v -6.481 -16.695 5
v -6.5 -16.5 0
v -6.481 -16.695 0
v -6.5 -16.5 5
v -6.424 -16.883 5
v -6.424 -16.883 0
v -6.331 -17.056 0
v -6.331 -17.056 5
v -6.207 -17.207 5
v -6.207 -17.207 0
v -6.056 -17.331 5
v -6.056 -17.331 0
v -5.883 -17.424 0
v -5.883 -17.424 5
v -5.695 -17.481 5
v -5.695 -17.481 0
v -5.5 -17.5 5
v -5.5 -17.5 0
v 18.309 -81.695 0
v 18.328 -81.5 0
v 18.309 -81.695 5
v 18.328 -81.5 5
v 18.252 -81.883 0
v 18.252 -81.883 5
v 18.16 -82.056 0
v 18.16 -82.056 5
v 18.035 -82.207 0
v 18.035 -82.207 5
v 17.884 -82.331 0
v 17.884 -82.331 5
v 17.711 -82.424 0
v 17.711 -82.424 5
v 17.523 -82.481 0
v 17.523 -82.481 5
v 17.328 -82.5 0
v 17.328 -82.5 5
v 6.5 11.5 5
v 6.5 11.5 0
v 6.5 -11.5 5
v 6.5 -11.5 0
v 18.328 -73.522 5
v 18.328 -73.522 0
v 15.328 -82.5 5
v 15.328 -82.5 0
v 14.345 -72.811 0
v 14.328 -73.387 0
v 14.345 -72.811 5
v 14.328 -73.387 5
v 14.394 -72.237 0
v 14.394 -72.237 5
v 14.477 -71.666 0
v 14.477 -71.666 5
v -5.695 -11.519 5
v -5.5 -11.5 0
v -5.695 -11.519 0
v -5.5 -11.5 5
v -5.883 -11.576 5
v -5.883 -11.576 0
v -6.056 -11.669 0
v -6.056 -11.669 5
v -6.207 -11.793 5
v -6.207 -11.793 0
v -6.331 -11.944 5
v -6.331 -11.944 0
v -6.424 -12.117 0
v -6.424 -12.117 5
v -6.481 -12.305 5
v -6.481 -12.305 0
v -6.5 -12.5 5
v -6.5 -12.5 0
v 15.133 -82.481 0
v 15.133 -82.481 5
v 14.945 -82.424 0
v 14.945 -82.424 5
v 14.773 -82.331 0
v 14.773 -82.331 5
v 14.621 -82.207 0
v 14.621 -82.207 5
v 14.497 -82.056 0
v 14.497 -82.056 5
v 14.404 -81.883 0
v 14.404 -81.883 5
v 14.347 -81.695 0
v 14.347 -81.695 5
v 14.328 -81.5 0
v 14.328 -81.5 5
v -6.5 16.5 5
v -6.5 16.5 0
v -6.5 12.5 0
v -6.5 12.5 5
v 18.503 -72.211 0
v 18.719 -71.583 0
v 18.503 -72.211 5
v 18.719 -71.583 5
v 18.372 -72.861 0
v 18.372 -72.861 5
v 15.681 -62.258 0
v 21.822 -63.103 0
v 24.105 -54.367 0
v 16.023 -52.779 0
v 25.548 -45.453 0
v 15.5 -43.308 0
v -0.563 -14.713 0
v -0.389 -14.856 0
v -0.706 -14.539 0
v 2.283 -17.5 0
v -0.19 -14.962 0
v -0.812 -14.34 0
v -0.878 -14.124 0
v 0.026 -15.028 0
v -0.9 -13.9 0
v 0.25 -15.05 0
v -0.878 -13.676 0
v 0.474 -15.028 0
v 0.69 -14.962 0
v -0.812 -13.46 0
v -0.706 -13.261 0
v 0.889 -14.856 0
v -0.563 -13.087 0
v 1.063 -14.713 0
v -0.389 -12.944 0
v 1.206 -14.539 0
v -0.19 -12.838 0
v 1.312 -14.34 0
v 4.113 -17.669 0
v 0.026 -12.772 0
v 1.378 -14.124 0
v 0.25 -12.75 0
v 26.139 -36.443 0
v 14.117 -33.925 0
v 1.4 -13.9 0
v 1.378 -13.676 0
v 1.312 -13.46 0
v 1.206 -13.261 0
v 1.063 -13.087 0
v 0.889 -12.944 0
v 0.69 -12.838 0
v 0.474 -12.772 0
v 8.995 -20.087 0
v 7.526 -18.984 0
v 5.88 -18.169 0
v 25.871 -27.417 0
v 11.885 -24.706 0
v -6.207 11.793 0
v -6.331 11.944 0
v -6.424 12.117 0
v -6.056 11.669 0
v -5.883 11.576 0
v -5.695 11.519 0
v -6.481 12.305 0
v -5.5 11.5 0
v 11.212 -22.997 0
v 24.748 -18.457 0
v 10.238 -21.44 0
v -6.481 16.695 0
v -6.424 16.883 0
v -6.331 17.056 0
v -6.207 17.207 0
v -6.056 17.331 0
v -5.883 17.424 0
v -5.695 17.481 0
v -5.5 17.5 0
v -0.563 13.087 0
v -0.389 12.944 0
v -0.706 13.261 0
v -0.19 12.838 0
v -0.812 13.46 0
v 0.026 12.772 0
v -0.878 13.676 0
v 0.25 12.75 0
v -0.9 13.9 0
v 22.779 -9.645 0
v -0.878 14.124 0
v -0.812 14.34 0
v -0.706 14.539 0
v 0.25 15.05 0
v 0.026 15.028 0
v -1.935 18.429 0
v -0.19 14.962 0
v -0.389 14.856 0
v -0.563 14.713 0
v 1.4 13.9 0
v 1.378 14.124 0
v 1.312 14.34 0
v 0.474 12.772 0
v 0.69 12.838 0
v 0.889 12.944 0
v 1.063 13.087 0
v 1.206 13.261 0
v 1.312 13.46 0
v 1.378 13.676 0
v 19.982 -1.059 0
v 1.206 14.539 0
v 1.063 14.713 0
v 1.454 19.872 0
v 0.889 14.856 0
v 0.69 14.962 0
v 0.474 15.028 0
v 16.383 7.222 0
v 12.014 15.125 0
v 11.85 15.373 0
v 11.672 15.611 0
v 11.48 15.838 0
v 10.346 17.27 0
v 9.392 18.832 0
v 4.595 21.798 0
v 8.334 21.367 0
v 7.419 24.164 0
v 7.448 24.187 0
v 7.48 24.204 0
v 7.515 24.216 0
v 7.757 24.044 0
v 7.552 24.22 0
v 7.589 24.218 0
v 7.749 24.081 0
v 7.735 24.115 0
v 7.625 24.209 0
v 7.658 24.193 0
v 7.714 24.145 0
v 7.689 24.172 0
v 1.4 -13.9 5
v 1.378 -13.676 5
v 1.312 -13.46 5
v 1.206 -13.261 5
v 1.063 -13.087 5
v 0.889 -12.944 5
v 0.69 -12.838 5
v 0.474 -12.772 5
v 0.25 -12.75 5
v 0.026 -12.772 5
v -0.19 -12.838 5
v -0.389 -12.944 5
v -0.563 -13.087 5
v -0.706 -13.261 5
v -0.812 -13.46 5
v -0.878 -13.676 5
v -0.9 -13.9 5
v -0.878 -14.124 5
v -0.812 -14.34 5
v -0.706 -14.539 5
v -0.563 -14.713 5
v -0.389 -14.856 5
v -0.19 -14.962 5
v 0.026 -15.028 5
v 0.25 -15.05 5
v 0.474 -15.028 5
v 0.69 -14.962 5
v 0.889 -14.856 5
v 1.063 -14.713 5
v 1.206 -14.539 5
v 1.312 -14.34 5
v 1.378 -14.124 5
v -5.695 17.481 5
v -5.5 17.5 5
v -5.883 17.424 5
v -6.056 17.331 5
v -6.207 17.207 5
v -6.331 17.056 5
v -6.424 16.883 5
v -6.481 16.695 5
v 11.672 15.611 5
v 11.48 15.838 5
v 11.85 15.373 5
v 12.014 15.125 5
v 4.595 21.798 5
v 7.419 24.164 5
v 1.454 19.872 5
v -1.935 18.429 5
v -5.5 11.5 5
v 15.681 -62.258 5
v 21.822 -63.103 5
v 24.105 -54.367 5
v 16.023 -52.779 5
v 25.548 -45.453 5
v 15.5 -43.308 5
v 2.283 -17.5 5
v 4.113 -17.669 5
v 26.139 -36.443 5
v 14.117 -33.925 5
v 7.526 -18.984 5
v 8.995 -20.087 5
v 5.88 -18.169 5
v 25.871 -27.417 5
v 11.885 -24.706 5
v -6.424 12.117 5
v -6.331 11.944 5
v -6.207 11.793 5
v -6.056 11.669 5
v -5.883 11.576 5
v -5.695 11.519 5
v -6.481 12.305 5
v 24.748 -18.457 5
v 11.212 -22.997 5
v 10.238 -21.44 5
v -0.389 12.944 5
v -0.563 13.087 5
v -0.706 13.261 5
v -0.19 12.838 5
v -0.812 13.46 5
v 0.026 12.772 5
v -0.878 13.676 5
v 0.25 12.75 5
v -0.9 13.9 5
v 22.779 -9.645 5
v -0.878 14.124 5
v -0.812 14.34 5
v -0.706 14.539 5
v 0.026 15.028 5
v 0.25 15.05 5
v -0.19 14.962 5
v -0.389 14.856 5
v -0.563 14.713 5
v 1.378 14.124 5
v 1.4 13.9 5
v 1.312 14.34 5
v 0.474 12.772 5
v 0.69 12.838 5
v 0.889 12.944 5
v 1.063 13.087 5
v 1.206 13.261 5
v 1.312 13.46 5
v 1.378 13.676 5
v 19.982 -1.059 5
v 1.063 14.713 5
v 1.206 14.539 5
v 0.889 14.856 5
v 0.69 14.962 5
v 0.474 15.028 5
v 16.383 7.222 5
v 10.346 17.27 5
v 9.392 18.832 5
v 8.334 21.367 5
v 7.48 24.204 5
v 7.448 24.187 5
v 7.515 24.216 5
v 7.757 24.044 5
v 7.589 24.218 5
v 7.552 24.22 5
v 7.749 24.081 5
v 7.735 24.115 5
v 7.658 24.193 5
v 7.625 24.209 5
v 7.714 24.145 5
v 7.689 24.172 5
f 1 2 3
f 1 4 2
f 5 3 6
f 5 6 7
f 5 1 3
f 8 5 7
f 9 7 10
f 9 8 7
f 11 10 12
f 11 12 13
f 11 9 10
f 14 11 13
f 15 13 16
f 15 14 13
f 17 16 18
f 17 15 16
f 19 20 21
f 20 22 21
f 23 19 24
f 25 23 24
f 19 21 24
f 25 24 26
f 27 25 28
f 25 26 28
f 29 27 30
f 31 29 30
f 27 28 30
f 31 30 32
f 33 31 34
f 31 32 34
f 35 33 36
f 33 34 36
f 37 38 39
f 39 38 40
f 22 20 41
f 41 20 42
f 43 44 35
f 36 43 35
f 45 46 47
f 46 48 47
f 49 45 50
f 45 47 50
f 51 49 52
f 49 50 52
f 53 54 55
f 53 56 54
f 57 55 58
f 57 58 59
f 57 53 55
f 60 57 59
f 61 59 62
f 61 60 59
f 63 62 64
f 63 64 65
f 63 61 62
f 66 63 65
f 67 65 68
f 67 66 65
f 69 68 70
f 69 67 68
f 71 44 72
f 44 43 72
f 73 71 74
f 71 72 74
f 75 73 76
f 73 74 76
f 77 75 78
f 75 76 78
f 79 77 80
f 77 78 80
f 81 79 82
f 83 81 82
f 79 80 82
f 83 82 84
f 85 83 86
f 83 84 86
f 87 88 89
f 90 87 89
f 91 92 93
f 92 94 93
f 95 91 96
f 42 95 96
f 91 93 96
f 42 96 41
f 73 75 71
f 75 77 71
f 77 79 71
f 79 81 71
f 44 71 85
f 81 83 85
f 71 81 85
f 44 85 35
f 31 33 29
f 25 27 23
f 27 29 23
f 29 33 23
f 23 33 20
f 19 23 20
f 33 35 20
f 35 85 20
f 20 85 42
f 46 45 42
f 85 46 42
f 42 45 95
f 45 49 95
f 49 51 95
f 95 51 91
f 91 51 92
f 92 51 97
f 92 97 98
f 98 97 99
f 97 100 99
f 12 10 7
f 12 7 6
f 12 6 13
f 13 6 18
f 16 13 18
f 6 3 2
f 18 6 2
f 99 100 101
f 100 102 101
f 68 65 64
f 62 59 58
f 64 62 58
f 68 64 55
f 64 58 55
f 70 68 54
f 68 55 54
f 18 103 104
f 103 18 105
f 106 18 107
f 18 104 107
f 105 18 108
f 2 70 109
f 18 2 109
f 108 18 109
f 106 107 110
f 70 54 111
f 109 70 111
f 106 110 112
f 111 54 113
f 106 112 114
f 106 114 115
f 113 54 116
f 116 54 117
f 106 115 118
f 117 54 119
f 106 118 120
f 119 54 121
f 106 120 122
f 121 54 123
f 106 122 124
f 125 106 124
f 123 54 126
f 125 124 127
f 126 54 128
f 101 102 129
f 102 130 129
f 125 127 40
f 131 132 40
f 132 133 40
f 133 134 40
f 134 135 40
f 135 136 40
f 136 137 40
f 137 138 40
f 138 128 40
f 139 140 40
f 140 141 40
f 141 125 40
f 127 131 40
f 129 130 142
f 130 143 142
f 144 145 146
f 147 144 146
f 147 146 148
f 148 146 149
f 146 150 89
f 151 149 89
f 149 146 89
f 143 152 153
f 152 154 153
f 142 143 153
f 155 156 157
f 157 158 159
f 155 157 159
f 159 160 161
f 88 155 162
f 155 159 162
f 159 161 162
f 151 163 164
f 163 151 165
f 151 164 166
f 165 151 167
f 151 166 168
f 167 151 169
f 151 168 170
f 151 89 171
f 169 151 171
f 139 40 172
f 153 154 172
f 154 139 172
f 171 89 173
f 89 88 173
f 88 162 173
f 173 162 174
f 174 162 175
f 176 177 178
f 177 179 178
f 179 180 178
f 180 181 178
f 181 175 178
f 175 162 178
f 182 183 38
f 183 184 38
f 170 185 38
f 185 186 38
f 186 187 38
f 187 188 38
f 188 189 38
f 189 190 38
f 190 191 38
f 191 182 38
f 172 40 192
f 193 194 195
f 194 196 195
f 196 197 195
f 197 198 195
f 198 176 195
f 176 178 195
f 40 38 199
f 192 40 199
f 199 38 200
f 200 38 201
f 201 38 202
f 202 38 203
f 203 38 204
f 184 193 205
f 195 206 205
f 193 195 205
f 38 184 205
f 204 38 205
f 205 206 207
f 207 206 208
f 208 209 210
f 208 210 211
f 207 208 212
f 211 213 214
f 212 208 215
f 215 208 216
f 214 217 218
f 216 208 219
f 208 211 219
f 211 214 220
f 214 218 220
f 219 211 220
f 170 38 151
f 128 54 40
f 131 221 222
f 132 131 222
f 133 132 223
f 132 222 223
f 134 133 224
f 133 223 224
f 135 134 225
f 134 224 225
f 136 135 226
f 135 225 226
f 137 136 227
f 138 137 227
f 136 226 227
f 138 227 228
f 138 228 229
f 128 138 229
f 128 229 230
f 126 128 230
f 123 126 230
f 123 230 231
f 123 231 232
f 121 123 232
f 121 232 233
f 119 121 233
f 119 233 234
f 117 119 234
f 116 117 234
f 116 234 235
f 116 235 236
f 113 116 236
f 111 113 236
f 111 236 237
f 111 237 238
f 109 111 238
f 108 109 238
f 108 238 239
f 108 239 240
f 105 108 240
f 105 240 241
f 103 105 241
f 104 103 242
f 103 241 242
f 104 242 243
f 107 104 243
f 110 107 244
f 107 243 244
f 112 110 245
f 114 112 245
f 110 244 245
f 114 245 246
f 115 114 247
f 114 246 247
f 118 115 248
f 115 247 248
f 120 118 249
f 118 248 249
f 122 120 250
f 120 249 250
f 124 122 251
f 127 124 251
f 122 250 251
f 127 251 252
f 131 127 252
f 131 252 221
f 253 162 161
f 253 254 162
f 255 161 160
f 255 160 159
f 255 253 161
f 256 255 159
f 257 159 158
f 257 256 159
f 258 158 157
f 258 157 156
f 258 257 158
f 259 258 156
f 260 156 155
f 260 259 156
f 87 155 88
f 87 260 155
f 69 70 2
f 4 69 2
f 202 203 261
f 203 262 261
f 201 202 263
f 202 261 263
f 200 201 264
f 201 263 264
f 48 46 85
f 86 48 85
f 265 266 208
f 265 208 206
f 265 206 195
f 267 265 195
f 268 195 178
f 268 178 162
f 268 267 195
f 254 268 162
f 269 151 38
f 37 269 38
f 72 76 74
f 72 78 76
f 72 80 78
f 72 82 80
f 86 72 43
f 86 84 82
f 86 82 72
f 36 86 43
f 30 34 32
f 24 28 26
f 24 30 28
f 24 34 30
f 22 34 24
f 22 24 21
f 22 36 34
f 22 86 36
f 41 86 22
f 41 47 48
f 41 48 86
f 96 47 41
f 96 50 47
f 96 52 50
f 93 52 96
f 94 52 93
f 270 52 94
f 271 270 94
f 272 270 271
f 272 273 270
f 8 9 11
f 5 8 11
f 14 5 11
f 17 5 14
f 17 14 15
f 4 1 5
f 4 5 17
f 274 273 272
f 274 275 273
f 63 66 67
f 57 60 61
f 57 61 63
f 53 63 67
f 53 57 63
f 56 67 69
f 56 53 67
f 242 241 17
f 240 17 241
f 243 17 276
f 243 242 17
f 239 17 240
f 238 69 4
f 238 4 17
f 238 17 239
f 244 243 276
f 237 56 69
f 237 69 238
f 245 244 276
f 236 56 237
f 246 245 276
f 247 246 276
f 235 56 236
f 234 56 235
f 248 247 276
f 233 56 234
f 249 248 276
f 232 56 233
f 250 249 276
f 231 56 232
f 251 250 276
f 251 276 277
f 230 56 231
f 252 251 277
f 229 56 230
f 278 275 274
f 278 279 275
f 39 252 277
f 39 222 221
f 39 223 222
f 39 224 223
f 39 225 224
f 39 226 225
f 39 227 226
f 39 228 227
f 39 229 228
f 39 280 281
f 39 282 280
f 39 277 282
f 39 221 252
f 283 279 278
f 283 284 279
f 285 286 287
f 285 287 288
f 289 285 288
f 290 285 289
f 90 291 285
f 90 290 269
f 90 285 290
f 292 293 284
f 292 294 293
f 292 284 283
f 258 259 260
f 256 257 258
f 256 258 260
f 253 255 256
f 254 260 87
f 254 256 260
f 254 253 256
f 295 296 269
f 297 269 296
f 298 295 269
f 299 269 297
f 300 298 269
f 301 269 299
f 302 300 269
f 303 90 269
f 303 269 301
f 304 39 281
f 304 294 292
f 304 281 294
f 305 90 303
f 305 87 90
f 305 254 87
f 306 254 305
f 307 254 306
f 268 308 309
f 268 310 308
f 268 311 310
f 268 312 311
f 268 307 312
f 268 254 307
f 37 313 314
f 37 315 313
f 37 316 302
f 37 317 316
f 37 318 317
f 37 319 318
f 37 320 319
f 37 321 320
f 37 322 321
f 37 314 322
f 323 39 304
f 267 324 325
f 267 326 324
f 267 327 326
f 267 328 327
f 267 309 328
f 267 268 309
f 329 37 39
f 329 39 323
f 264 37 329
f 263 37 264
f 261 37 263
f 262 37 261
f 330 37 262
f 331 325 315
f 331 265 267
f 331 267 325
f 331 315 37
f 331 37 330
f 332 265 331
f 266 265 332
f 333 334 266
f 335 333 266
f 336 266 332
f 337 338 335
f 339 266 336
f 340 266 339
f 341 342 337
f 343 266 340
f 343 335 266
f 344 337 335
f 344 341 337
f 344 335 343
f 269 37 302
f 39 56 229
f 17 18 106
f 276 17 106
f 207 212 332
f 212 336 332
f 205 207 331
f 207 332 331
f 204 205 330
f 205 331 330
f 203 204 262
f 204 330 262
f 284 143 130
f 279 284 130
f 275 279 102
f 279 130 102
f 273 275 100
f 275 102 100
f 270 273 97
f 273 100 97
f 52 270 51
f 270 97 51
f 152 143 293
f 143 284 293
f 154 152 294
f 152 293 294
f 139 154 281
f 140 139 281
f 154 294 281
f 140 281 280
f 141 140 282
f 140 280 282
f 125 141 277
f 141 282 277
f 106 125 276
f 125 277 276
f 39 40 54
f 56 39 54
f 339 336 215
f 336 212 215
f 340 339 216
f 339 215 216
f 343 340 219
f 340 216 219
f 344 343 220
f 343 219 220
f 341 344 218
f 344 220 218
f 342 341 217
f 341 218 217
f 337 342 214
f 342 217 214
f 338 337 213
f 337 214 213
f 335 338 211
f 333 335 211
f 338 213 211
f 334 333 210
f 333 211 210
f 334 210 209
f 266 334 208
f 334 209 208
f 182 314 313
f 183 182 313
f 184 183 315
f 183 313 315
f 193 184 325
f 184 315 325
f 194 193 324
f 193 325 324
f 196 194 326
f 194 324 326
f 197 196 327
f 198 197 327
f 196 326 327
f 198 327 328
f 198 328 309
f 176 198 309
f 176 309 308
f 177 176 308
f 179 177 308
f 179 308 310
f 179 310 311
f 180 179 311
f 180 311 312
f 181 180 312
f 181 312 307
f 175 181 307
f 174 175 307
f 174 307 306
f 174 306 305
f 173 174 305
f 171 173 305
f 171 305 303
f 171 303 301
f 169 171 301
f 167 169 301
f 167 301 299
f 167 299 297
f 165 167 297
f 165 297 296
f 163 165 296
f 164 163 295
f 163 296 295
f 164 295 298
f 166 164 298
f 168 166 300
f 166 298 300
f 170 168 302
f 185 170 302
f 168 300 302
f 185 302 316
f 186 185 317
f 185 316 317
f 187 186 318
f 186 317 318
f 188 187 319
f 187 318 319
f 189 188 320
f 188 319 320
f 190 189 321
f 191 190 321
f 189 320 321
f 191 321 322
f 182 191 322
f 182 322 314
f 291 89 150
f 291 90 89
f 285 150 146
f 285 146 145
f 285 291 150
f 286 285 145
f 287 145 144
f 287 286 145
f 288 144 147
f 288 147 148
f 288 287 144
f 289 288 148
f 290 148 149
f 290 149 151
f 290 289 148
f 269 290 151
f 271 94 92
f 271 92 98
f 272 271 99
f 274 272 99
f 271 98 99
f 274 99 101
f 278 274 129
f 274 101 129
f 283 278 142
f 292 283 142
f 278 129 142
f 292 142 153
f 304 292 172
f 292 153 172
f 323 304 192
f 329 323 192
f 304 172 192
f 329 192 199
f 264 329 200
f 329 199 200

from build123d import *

# Parameters (mm, degrees)
BOSS_EXTRUDE1_DEPTH = 5
SKETCH2_R           = 1.15
CUT_EXTRUDE1_DEPTH  = 87.690729745
FILLET1_R           = 5
FILLET3_R           = 1
FILLET12_R          = 5
FILLET14_R          = 1
FILLET15_R          = 10
FILLET16_R          = 10
BOSS_EXTRUDE2_DEPTH = 5
FILLET17_R          = 0.2
FILLET18_R          = 15


with BuildPart() as part:
    # Sketch1 → Boss-Extrude1 (new body)
    with BuildSketch(Plane.XY):
        with BuildLine():
            Line((-6.5, 17.5), (-6.5, 11.5))
            Line((-6.5, 11.5), (6.5, 11.5))
            Line((6.5, 11.5), (6.5, -11.5))
            Line((6.5, -11.5), (-6.5, -11.5))
            Line((-6.5, -11.5), (-6.5, -17.5))
            Line((-6.5, -17.5), (9.5, -17.5))
            ThreePointArc((9.5, -17.5), (15.62941886, -44.673850811), (14.328125353, -72.5))
            Line((14.328125353, -72.5), (14.328125353, -82.5))
            Line((14.328125353, -82.5), (18.328125353, -82.5))
            Line((18.328125353, -82.5), (18.328125353, -72.5))
            ThreePointArc((18.328125353, -72.5), (25.796688212, -26.509948672), (10.5, 17.5))
            Line((10.5, 17.5), (-6.5, 17.5))
        make_face()
    extrude(amount=BOSS_EXTRUDE1_DEPTH)

    # Sketch2 → Cut-Extrude1 (cut, through all)
    with BuildSketch(Plane.XY.offset(5)):
        with Locations((0.25, 13.9)):
            Circle(SKETCH2_R)
        with Locations((0.25, -13.9)):
            Circle(SKETCH2_R)
    extrude(amount=-CUT_EXTRUDE1_DEPTH, mode=Mode.SUBTRACT)

    # Fillet1
    fillet1_edges = [part.edges().sort_by_distance(p)[0] for p in [
        (10.5, 17.5, 2.5),
    ]]
    fillet(fillet1_edges, radius=FILLET1_R)

    # Fillet3
    fillet3_edges = [part.edges().sort_by_distance(p)[0] for p in [
        (-6.5, -17.5, 2.5),
        (-6.5, -11.5, 2.5),
        (-6.5, 11.5, 2.5),
        (-6.5, 17.5, 2.5),
    ]]
    fillet(fillet3_edges, radius=FILLET3_R)

    # Fillet12
    fillet12_edges = [part.edges().sort_by_distance(p)[0] for p in [
        (18.328125353, -72.5, 2.5),
    ]]
    fillet(fillet12_edges, radius=FILLET12_R)

    # Fillet14
    fillet14_edges = [part.edges().sort_by_distance(p)[0] for p in [
        (18.328125353, -82.5, 2.5),
        (14.328125353, -82.5, 2.5),
    ]]
    fillet(fillet14_edges, radius=FILLET14_R)

    # Fillet15
    fillet15_edges = [part.edges().sort_by_distance(p)[0] for p in [
        (14.328125353, -72.5, 2.5),
    ]]
    fillet(fillet15_edges, radius=FILLET15_R)

    # Fillet16
    fillet16_edges = [part.edges().sort_by_distance(p)[0] for p in [
        (9.5, -17.5, 2.5),
    ]]
    fillet(fillet16_edges, radius=FILLET16_R)

    # Sketch3 → Boss-Extrude2 (add)
    with BuildSketch(Plane.XY.offset(5)):
        with BuildLine():
            Line((-5.5, 17.5), (7.758219973, 17.5))
            Line((7.758219973, 17.5), (7.758219973, 24.5))
            ThreePointArc((7.758219973, 24.5), (1.666211007, 19.982713789), (-5.5, 17.5))
        make_face()
    extrude(amount=-BOSS_EXTRUDE2_DEPTH)

    # Fillet17
    fillet17_edges = [part.edges().sort_by_distance(p)[0] for p in [
        (7.758219973, 24.5, 2.5),
    ]]
    fillet(fillet17_edges, radius=FILLET17_R)

    # Fillet18
    fillet18_edges = [part.edges().sort_by_distance(p)[0] for p in [
        (7.758219973, 17.5, 2.5),
    ]]
    fillet(fillet18_edges, radius=FILLET18_R)


solid = part.part
